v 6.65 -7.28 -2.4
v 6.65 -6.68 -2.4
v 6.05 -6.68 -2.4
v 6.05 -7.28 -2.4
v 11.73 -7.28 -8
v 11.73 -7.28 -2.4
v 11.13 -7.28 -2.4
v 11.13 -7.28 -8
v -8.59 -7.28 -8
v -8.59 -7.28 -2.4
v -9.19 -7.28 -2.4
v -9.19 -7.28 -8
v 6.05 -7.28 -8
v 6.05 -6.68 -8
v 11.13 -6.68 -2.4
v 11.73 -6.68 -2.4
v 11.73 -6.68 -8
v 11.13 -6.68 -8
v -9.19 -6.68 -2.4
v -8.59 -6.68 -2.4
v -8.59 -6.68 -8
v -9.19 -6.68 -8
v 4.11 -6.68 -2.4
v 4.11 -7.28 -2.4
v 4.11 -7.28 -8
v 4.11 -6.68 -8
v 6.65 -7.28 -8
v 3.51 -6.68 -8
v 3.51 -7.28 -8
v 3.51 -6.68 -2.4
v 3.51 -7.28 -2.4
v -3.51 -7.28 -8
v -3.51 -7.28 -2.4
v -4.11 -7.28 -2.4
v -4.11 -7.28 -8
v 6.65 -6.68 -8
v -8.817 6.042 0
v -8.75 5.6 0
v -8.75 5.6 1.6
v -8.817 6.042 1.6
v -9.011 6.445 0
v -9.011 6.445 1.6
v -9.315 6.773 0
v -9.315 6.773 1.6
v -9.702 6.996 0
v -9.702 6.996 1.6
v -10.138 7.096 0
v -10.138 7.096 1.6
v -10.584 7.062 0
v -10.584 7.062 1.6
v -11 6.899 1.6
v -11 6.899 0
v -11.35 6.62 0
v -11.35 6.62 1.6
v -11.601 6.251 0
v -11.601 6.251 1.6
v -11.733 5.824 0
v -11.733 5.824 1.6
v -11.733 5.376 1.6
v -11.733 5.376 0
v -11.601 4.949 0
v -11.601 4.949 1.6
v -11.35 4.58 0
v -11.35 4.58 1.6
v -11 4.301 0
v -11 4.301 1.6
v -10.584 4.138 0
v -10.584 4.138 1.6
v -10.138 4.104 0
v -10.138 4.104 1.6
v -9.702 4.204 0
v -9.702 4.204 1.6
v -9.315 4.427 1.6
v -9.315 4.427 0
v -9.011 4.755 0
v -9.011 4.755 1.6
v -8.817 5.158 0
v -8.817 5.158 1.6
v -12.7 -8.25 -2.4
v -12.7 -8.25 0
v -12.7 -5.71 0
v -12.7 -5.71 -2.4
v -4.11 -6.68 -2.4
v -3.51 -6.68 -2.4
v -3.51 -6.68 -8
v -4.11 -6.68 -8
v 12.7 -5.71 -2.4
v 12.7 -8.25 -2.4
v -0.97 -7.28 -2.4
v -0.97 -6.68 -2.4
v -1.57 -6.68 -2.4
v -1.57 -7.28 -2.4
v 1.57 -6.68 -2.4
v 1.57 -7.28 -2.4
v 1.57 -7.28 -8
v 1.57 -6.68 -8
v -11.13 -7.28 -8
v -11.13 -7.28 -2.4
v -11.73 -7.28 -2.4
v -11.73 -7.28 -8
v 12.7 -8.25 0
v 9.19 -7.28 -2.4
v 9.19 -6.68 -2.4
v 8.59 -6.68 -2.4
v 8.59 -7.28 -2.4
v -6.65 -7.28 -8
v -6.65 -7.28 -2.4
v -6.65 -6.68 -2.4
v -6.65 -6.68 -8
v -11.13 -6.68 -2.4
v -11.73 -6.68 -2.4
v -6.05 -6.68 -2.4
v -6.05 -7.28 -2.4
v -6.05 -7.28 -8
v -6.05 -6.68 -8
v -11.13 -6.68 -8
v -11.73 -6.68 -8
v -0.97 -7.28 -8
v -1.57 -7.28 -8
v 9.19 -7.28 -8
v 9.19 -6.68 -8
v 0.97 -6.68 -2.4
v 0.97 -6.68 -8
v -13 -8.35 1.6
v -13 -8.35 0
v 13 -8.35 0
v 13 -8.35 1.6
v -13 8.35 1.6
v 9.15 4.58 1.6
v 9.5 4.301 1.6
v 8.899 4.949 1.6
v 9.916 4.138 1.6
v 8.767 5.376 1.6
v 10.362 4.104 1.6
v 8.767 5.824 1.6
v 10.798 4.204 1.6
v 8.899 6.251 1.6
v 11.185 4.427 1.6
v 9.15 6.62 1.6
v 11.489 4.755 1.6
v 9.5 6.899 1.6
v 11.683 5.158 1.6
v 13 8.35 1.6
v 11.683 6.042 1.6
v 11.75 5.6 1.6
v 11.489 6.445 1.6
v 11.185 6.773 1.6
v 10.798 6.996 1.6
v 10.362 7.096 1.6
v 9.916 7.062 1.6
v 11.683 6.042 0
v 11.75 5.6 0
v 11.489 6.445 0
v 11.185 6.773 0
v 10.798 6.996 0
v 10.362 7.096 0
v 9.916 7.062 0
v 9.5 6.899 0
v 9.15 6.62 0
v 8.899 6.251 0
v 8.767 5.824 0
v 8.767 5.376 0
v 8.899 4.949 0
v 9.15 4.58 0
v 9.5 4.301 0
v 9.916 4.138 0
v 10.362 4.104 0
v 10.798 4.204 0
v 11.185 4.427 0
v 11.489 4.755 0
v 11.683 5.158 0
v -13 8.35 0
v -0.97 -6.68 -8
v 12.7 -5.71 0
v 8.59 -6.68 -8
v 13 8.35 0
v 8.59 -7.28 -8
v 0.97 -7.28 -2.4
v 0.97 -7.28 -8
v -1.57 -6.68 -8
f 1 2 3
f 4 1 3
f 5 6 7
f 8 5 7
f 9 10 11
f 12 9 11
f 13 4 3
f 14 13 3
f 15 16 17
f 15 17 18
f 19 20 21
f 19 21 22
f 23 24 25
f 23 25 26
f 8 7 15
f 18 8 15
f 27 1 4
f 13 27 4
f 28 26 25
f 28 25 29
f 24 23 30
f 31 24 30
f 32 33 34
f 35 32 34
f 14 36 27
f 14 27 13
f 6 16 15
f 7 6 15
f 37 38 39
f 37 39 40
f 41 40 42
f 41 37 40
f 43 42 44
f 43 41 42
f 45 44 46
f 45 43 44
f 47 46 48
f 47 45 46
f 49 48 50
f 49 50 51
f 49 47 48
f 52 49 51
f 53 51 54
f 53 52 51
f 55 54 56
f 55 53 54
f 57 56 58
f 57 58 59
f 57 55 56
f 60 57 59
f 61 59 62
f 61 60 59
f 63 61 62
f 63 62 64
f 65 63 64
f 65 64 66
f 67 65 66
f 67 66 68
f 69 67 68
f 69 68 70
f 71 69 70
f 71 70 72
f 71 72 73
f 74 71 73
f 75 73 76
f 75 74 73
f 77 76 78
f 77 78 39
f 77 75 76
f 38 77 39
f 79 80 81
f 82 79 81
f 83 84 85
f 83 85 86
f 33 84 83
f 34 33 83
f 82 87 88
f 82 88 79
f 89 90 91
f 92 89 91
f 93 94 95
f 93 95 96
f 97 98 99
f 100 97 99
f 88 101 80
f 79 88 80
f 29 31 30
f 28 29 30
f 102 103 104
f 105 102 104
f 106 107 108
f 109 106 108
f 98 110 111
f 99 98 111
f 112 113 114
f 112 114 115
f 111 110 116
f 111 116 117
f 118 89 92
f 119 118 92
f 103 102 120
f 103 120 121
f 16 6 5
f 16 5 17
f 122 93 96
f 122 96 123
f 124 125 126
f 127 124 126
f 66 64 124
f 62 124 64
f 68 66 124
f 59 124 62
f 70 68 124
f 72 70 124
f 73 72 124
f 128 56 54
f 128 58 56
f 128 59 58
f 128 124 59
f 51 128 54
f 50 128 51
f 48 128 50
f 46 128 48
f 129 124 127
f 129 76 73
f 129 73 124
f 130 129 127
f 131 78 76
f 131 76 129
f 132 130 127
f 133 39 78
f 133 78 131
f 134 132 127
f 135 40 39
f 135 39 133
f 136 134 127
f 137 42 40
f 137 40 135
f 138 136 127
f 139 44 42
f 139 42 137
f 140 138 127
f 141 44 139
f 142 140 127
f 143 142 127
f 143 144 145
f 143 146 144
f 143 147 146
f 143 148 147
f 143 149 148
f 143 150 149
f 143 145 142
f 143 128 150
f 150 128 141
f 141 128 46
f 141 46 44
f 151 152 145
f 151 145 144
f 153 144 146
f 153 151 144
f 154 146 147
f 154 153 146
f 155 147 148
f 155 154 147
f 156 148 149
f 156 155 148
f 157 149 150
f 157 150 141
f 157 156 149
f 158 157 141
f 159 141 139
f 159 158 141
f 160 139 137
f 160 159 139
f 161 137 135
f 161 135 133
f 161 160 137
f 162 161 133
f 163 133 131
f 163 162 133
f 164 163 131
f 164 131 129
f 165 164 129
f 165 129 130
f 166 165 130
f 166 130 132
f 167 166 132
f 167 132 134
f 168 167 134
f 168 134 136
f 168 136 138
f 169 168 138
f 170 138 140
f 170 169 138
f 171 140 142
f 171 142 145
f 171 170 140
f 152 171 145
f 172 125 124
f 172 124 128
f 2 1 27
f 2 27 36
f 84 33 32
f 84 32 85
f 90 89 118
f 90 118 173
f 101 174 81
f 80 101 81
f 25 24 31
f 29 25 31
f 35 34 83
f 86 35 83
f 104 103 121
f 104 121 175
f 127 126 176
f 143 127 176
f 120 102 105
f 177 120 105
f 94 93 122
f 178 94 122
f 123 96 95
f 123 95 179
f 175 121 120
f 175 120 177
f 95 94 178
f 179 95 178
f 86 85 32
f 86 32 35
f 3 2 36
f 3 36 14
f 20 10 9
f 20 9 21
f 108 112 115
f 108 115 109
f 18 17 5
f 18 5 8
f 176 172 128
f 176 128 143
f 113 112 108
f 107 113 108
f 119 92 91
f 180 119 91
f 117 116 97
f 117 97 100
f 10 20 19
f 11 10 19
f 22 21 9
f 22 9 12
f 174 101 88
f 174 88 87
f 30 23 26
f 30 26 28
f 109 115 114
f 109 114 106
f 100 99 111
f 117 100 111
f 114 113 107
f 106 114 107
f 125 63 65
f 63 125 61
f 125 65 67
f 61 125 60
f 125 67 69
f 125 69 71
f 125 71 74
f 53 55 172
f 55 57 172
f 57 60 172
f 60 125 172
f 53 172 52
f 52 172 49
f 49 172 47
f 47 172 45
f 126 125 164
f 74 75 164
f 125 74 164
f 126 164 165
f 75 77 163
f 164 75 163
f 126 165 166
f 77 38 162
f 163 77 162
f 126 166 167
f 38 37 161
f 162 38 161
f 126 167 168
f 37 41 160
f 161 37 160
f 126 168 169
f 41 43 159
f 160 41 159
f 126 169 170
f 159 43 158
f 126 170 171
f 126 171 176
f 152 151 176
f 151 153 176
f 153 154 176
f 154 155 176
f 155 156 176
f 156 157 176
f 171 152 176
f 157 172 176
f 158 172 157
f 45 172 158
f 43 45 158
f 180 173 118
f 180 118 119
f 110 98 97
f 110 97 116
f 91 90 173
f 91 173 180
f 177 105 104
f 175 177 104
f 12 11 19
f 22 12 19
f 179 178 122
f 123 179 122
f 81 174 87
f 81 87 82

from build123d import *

# Parameters (mm, degrees)
SKIZZE1_W                          = 26
SKIZZE1_H                          = 16.7
SKIZZE1_R                          = 1.5
AUFSATZ_LINEAR_AUSTRAGEN1_DEPTH    = 1.6
SKIZZE3_W                          = 25.4
SKIZZE3_H                          = 2.54
AUFSATZ_LINEAR_AUSTRAGEN2_DEPTH    = 2.4
SKIZZE4_W                          = 0.6
SKIZZE4_H                          = 0.6
AUFSATZ_LINEAR_AUSTRAGEN3_DEPTH    = 5.6
AUFSATZ_LINEAR_AUSTRAGEN3_2_DEPTH  = 5.6
AUFSATZ_LINEAR_AUSTRAGEN3_3_DEPTH  = 5.6
AUFSATZ_LINEAR_AUSTRAGEN3_4_DEPTH  = 5.6
AUFSATZ_LINEAR_AUSTRAGEN3_5_DEPTH  = 5.6
AUFSATZ_LINEAR_AUSTRAGEN3_6_DEPTH  = 5.6
AUFSATZ_LINEAR_AUSTRAGEN3_7_DEPTH  = 5.6
AUFSATZ_LINEAR_AUSTRAGEN3_8_DEPTH  = 5.6
AUFSATZ_LINEAR_AUSTRAGEN3_9_DEPTH  = 5.6
AUFSATZ_LINEAR_AUSTRAGEN3_10_DEPTH = 5.6


with BuildPart() as part:
    # Skizze1 → Aufsatz-Linear austragen1 (new body)
    with BuildSketch(Plane.XY):
        Rectangle(SKIZZE1_W, SKIZZE1_H)
        with Locations((-10.25, 5.6)):
            Circle(SKIZZE1_R, mode=Mode.SUBTRACT)
        with Locations((10.25, 5.6)):
            Circle(SKIZZE1_R, mode=Mode.SUBTRACT)
    extrude(amount=AUFSATZ_LINEAR_AUSTRAGEN1_DEPTH)


with BuildPart() as body_2:
    # Skizze3 → Aufsatz-Linear austragen2 (new body)
    with BuildSketch(Plane(origin=(0, 0, 0), x_dir=(-1, 0, 0), z_dir=(0, 0, -1))):
        with Locations((0, -6.98)):
            Rectangle(SKIZZE3_W, SKIZZE3_H)
    extrude(amount=AUFSATZ_LINEAR_AUSTRAGEN2_DEPTH)


with BuildPart() as body_3:
    # Skizze4 → Aufsatz-Linear austragen3 (new body)
    with BuildSketch(Plane(origin=(0, 0, -2.4), x_dir=(-1, 0, 0), z_dir=(0, 0, -1))):
        with Locations((-11.43, -6.98)):
            Rectangle(SKIZZE4_W, SKIZZE4_H)
    extrude(amount=AUFSATZ_LINEAR_AUSTRAGEN3_DEPTH)


with BuildPart() as body_4:
    # Skizze4 → Aufsatz-Linear austragen3 2 (new body)
    with BuildSketch(Plane(origin=(0, 0, -2.4), x_dir=(-1, 0, 0), z_dir=(0, 0, -1))):
        with Locations((-8.89, -6.98)):
            Rectangle(SKIZZE4_W, SKIZZE4_H)
    extrude(amount=AUFSATZ_LINEAR_AUSTRAGEN3_2_DEPTH)


with BuildPart() as body_5:
    # Skizze4 → Aufsatz-Linear austragen3 3 (new body)
    with BuildSketch(Plane(origin=(0, 0, -2.4), x_dir=(-1, 0, 0), z_dir=(0, 0, -1))):
        with Locations((-6.35, -6.98)):
            Rectangle(SKIZZE4_W, SKIZZE4_H)
    extrude(amount=AUFSATZ_LINEAR_AUSTRAGEN3_3_DEPTH)


with BuildPart() as body_6:
    # Skizze4 → Aufsatz-Linear austragen3 4 (new body)
    with BuildSketch(Plane(origin=(0, 0, -2.4), x_dir=(-1, 0, 0), z_dir=(0, 0, -1))):
        with Locations((-3.81, -6.98)):
            Rectangle(SKIZZE4_W, SKIZZE4_H)
    extrude(amount=AUFSATZ_LINEAR_AUSTRAGEN3_4_DEPTH)


with BuildPart() as body_7:
    # Skizze4 → Aufsatz-Linear austragen3 5 (new body)
    with BuildSketch(Plane(origin=(0, 0, -2.4), x_dir=(-1, 0, 0), z_dir=(0, 0, -1))):
        with Locations((-1.27, -6.98)):
            Rectangle(SKIZZE4_W, SKIZZE4_H)
    extrude(amount=AUFSATZ_LINEAR_AUSTRAGEN3_5_DEPTH)


with BuildPart() as body_8:
    # Skizze4 → Aufsatz-Linear austragen3 6 (new body)
    with BuildSketch(Plane(origin=(0, 0, -2.4), x_dir=(-1, 0, 0), z_dir=(0, 0, -1))):
        with Locations((1.27, -6.98)):
            Rectangle(SKIZZE4_W, SKIZZE4_H)
    extrude(amount=AUFSATZ_LINEAR_AUSTRAGEN3_6_DEPTH)


with BuildPart() as body_9:
    # Skizze4 → Aufsatz-Linear austragen3 7 (new body)
    with BuildSketch(Plane(origin=(0, 0, -2.4), x_dir=(-1, 0, 0), z_dir=(0, 0, -1))):
        with Locations((3.81, -6.98)):
            Rectangle(SKIZZE4_W, SKIZZE4_H)
    extrude(amount=AUFSATZ_LINEAR_AUSTRAGEN3_7_DEPTH)


with BuildPart() as body_10:
    # Skizze4 → Aufsatz-Linear austragen3 8 (new body)
    with BuildSketch(Plane(origin=(0, 0, -2.4), x_dir=(-1, 0, 0), z_dir=(0, 0, -1))):
        with Locations((6.35, -6.98)):
            Rectangle(SKIZZE4_W, SKIZZE4_H)
    extrude(amount=AUFSATZ_LINEAR_AUSTRAGEN3_8_DEPTH)


with BuildPart() as body_11:
    # Skizze4 → Aufsatz-Linear austragen3 9 (new body)
    with BuildSketch(Plane(origin=(0, 0, -2.4), x_dir=(-1, 0, 0), z_dir=(0, 0, -1))):
        with Locations((8.89, -6.98)):
            Rectangle(SKIZZE4_W, SKIZZE4_H)
    extrude(amount=AUFSATZ_LINEAR_AUSTRAGEN3_9_DEPTH)


with BuildPart() as body_12:
    # Skizze4 → Aufsatz-Linear austragen3 10 (new body)
    with BuildSketch(Plane(origin=(0, 0, -2.4), x_dir=(-1, 0, 0), z_dir=(0, 0, -1))):
        with Locations((11.43, -6.98)):
            Rectangle(SKIZZE4_W, SKIZZE4_H)
    extrude(amount=AUFSATZ_LINEAR_AUSTRAGEN3_10_DEPTH)


solid = Compound([part.part, body_2.part, body_3.part, body_4.part, body_5.part, body_6.part, body_7.part, body_8.part, body_9.part, body_10.part, body_11.part, body_12.part])
